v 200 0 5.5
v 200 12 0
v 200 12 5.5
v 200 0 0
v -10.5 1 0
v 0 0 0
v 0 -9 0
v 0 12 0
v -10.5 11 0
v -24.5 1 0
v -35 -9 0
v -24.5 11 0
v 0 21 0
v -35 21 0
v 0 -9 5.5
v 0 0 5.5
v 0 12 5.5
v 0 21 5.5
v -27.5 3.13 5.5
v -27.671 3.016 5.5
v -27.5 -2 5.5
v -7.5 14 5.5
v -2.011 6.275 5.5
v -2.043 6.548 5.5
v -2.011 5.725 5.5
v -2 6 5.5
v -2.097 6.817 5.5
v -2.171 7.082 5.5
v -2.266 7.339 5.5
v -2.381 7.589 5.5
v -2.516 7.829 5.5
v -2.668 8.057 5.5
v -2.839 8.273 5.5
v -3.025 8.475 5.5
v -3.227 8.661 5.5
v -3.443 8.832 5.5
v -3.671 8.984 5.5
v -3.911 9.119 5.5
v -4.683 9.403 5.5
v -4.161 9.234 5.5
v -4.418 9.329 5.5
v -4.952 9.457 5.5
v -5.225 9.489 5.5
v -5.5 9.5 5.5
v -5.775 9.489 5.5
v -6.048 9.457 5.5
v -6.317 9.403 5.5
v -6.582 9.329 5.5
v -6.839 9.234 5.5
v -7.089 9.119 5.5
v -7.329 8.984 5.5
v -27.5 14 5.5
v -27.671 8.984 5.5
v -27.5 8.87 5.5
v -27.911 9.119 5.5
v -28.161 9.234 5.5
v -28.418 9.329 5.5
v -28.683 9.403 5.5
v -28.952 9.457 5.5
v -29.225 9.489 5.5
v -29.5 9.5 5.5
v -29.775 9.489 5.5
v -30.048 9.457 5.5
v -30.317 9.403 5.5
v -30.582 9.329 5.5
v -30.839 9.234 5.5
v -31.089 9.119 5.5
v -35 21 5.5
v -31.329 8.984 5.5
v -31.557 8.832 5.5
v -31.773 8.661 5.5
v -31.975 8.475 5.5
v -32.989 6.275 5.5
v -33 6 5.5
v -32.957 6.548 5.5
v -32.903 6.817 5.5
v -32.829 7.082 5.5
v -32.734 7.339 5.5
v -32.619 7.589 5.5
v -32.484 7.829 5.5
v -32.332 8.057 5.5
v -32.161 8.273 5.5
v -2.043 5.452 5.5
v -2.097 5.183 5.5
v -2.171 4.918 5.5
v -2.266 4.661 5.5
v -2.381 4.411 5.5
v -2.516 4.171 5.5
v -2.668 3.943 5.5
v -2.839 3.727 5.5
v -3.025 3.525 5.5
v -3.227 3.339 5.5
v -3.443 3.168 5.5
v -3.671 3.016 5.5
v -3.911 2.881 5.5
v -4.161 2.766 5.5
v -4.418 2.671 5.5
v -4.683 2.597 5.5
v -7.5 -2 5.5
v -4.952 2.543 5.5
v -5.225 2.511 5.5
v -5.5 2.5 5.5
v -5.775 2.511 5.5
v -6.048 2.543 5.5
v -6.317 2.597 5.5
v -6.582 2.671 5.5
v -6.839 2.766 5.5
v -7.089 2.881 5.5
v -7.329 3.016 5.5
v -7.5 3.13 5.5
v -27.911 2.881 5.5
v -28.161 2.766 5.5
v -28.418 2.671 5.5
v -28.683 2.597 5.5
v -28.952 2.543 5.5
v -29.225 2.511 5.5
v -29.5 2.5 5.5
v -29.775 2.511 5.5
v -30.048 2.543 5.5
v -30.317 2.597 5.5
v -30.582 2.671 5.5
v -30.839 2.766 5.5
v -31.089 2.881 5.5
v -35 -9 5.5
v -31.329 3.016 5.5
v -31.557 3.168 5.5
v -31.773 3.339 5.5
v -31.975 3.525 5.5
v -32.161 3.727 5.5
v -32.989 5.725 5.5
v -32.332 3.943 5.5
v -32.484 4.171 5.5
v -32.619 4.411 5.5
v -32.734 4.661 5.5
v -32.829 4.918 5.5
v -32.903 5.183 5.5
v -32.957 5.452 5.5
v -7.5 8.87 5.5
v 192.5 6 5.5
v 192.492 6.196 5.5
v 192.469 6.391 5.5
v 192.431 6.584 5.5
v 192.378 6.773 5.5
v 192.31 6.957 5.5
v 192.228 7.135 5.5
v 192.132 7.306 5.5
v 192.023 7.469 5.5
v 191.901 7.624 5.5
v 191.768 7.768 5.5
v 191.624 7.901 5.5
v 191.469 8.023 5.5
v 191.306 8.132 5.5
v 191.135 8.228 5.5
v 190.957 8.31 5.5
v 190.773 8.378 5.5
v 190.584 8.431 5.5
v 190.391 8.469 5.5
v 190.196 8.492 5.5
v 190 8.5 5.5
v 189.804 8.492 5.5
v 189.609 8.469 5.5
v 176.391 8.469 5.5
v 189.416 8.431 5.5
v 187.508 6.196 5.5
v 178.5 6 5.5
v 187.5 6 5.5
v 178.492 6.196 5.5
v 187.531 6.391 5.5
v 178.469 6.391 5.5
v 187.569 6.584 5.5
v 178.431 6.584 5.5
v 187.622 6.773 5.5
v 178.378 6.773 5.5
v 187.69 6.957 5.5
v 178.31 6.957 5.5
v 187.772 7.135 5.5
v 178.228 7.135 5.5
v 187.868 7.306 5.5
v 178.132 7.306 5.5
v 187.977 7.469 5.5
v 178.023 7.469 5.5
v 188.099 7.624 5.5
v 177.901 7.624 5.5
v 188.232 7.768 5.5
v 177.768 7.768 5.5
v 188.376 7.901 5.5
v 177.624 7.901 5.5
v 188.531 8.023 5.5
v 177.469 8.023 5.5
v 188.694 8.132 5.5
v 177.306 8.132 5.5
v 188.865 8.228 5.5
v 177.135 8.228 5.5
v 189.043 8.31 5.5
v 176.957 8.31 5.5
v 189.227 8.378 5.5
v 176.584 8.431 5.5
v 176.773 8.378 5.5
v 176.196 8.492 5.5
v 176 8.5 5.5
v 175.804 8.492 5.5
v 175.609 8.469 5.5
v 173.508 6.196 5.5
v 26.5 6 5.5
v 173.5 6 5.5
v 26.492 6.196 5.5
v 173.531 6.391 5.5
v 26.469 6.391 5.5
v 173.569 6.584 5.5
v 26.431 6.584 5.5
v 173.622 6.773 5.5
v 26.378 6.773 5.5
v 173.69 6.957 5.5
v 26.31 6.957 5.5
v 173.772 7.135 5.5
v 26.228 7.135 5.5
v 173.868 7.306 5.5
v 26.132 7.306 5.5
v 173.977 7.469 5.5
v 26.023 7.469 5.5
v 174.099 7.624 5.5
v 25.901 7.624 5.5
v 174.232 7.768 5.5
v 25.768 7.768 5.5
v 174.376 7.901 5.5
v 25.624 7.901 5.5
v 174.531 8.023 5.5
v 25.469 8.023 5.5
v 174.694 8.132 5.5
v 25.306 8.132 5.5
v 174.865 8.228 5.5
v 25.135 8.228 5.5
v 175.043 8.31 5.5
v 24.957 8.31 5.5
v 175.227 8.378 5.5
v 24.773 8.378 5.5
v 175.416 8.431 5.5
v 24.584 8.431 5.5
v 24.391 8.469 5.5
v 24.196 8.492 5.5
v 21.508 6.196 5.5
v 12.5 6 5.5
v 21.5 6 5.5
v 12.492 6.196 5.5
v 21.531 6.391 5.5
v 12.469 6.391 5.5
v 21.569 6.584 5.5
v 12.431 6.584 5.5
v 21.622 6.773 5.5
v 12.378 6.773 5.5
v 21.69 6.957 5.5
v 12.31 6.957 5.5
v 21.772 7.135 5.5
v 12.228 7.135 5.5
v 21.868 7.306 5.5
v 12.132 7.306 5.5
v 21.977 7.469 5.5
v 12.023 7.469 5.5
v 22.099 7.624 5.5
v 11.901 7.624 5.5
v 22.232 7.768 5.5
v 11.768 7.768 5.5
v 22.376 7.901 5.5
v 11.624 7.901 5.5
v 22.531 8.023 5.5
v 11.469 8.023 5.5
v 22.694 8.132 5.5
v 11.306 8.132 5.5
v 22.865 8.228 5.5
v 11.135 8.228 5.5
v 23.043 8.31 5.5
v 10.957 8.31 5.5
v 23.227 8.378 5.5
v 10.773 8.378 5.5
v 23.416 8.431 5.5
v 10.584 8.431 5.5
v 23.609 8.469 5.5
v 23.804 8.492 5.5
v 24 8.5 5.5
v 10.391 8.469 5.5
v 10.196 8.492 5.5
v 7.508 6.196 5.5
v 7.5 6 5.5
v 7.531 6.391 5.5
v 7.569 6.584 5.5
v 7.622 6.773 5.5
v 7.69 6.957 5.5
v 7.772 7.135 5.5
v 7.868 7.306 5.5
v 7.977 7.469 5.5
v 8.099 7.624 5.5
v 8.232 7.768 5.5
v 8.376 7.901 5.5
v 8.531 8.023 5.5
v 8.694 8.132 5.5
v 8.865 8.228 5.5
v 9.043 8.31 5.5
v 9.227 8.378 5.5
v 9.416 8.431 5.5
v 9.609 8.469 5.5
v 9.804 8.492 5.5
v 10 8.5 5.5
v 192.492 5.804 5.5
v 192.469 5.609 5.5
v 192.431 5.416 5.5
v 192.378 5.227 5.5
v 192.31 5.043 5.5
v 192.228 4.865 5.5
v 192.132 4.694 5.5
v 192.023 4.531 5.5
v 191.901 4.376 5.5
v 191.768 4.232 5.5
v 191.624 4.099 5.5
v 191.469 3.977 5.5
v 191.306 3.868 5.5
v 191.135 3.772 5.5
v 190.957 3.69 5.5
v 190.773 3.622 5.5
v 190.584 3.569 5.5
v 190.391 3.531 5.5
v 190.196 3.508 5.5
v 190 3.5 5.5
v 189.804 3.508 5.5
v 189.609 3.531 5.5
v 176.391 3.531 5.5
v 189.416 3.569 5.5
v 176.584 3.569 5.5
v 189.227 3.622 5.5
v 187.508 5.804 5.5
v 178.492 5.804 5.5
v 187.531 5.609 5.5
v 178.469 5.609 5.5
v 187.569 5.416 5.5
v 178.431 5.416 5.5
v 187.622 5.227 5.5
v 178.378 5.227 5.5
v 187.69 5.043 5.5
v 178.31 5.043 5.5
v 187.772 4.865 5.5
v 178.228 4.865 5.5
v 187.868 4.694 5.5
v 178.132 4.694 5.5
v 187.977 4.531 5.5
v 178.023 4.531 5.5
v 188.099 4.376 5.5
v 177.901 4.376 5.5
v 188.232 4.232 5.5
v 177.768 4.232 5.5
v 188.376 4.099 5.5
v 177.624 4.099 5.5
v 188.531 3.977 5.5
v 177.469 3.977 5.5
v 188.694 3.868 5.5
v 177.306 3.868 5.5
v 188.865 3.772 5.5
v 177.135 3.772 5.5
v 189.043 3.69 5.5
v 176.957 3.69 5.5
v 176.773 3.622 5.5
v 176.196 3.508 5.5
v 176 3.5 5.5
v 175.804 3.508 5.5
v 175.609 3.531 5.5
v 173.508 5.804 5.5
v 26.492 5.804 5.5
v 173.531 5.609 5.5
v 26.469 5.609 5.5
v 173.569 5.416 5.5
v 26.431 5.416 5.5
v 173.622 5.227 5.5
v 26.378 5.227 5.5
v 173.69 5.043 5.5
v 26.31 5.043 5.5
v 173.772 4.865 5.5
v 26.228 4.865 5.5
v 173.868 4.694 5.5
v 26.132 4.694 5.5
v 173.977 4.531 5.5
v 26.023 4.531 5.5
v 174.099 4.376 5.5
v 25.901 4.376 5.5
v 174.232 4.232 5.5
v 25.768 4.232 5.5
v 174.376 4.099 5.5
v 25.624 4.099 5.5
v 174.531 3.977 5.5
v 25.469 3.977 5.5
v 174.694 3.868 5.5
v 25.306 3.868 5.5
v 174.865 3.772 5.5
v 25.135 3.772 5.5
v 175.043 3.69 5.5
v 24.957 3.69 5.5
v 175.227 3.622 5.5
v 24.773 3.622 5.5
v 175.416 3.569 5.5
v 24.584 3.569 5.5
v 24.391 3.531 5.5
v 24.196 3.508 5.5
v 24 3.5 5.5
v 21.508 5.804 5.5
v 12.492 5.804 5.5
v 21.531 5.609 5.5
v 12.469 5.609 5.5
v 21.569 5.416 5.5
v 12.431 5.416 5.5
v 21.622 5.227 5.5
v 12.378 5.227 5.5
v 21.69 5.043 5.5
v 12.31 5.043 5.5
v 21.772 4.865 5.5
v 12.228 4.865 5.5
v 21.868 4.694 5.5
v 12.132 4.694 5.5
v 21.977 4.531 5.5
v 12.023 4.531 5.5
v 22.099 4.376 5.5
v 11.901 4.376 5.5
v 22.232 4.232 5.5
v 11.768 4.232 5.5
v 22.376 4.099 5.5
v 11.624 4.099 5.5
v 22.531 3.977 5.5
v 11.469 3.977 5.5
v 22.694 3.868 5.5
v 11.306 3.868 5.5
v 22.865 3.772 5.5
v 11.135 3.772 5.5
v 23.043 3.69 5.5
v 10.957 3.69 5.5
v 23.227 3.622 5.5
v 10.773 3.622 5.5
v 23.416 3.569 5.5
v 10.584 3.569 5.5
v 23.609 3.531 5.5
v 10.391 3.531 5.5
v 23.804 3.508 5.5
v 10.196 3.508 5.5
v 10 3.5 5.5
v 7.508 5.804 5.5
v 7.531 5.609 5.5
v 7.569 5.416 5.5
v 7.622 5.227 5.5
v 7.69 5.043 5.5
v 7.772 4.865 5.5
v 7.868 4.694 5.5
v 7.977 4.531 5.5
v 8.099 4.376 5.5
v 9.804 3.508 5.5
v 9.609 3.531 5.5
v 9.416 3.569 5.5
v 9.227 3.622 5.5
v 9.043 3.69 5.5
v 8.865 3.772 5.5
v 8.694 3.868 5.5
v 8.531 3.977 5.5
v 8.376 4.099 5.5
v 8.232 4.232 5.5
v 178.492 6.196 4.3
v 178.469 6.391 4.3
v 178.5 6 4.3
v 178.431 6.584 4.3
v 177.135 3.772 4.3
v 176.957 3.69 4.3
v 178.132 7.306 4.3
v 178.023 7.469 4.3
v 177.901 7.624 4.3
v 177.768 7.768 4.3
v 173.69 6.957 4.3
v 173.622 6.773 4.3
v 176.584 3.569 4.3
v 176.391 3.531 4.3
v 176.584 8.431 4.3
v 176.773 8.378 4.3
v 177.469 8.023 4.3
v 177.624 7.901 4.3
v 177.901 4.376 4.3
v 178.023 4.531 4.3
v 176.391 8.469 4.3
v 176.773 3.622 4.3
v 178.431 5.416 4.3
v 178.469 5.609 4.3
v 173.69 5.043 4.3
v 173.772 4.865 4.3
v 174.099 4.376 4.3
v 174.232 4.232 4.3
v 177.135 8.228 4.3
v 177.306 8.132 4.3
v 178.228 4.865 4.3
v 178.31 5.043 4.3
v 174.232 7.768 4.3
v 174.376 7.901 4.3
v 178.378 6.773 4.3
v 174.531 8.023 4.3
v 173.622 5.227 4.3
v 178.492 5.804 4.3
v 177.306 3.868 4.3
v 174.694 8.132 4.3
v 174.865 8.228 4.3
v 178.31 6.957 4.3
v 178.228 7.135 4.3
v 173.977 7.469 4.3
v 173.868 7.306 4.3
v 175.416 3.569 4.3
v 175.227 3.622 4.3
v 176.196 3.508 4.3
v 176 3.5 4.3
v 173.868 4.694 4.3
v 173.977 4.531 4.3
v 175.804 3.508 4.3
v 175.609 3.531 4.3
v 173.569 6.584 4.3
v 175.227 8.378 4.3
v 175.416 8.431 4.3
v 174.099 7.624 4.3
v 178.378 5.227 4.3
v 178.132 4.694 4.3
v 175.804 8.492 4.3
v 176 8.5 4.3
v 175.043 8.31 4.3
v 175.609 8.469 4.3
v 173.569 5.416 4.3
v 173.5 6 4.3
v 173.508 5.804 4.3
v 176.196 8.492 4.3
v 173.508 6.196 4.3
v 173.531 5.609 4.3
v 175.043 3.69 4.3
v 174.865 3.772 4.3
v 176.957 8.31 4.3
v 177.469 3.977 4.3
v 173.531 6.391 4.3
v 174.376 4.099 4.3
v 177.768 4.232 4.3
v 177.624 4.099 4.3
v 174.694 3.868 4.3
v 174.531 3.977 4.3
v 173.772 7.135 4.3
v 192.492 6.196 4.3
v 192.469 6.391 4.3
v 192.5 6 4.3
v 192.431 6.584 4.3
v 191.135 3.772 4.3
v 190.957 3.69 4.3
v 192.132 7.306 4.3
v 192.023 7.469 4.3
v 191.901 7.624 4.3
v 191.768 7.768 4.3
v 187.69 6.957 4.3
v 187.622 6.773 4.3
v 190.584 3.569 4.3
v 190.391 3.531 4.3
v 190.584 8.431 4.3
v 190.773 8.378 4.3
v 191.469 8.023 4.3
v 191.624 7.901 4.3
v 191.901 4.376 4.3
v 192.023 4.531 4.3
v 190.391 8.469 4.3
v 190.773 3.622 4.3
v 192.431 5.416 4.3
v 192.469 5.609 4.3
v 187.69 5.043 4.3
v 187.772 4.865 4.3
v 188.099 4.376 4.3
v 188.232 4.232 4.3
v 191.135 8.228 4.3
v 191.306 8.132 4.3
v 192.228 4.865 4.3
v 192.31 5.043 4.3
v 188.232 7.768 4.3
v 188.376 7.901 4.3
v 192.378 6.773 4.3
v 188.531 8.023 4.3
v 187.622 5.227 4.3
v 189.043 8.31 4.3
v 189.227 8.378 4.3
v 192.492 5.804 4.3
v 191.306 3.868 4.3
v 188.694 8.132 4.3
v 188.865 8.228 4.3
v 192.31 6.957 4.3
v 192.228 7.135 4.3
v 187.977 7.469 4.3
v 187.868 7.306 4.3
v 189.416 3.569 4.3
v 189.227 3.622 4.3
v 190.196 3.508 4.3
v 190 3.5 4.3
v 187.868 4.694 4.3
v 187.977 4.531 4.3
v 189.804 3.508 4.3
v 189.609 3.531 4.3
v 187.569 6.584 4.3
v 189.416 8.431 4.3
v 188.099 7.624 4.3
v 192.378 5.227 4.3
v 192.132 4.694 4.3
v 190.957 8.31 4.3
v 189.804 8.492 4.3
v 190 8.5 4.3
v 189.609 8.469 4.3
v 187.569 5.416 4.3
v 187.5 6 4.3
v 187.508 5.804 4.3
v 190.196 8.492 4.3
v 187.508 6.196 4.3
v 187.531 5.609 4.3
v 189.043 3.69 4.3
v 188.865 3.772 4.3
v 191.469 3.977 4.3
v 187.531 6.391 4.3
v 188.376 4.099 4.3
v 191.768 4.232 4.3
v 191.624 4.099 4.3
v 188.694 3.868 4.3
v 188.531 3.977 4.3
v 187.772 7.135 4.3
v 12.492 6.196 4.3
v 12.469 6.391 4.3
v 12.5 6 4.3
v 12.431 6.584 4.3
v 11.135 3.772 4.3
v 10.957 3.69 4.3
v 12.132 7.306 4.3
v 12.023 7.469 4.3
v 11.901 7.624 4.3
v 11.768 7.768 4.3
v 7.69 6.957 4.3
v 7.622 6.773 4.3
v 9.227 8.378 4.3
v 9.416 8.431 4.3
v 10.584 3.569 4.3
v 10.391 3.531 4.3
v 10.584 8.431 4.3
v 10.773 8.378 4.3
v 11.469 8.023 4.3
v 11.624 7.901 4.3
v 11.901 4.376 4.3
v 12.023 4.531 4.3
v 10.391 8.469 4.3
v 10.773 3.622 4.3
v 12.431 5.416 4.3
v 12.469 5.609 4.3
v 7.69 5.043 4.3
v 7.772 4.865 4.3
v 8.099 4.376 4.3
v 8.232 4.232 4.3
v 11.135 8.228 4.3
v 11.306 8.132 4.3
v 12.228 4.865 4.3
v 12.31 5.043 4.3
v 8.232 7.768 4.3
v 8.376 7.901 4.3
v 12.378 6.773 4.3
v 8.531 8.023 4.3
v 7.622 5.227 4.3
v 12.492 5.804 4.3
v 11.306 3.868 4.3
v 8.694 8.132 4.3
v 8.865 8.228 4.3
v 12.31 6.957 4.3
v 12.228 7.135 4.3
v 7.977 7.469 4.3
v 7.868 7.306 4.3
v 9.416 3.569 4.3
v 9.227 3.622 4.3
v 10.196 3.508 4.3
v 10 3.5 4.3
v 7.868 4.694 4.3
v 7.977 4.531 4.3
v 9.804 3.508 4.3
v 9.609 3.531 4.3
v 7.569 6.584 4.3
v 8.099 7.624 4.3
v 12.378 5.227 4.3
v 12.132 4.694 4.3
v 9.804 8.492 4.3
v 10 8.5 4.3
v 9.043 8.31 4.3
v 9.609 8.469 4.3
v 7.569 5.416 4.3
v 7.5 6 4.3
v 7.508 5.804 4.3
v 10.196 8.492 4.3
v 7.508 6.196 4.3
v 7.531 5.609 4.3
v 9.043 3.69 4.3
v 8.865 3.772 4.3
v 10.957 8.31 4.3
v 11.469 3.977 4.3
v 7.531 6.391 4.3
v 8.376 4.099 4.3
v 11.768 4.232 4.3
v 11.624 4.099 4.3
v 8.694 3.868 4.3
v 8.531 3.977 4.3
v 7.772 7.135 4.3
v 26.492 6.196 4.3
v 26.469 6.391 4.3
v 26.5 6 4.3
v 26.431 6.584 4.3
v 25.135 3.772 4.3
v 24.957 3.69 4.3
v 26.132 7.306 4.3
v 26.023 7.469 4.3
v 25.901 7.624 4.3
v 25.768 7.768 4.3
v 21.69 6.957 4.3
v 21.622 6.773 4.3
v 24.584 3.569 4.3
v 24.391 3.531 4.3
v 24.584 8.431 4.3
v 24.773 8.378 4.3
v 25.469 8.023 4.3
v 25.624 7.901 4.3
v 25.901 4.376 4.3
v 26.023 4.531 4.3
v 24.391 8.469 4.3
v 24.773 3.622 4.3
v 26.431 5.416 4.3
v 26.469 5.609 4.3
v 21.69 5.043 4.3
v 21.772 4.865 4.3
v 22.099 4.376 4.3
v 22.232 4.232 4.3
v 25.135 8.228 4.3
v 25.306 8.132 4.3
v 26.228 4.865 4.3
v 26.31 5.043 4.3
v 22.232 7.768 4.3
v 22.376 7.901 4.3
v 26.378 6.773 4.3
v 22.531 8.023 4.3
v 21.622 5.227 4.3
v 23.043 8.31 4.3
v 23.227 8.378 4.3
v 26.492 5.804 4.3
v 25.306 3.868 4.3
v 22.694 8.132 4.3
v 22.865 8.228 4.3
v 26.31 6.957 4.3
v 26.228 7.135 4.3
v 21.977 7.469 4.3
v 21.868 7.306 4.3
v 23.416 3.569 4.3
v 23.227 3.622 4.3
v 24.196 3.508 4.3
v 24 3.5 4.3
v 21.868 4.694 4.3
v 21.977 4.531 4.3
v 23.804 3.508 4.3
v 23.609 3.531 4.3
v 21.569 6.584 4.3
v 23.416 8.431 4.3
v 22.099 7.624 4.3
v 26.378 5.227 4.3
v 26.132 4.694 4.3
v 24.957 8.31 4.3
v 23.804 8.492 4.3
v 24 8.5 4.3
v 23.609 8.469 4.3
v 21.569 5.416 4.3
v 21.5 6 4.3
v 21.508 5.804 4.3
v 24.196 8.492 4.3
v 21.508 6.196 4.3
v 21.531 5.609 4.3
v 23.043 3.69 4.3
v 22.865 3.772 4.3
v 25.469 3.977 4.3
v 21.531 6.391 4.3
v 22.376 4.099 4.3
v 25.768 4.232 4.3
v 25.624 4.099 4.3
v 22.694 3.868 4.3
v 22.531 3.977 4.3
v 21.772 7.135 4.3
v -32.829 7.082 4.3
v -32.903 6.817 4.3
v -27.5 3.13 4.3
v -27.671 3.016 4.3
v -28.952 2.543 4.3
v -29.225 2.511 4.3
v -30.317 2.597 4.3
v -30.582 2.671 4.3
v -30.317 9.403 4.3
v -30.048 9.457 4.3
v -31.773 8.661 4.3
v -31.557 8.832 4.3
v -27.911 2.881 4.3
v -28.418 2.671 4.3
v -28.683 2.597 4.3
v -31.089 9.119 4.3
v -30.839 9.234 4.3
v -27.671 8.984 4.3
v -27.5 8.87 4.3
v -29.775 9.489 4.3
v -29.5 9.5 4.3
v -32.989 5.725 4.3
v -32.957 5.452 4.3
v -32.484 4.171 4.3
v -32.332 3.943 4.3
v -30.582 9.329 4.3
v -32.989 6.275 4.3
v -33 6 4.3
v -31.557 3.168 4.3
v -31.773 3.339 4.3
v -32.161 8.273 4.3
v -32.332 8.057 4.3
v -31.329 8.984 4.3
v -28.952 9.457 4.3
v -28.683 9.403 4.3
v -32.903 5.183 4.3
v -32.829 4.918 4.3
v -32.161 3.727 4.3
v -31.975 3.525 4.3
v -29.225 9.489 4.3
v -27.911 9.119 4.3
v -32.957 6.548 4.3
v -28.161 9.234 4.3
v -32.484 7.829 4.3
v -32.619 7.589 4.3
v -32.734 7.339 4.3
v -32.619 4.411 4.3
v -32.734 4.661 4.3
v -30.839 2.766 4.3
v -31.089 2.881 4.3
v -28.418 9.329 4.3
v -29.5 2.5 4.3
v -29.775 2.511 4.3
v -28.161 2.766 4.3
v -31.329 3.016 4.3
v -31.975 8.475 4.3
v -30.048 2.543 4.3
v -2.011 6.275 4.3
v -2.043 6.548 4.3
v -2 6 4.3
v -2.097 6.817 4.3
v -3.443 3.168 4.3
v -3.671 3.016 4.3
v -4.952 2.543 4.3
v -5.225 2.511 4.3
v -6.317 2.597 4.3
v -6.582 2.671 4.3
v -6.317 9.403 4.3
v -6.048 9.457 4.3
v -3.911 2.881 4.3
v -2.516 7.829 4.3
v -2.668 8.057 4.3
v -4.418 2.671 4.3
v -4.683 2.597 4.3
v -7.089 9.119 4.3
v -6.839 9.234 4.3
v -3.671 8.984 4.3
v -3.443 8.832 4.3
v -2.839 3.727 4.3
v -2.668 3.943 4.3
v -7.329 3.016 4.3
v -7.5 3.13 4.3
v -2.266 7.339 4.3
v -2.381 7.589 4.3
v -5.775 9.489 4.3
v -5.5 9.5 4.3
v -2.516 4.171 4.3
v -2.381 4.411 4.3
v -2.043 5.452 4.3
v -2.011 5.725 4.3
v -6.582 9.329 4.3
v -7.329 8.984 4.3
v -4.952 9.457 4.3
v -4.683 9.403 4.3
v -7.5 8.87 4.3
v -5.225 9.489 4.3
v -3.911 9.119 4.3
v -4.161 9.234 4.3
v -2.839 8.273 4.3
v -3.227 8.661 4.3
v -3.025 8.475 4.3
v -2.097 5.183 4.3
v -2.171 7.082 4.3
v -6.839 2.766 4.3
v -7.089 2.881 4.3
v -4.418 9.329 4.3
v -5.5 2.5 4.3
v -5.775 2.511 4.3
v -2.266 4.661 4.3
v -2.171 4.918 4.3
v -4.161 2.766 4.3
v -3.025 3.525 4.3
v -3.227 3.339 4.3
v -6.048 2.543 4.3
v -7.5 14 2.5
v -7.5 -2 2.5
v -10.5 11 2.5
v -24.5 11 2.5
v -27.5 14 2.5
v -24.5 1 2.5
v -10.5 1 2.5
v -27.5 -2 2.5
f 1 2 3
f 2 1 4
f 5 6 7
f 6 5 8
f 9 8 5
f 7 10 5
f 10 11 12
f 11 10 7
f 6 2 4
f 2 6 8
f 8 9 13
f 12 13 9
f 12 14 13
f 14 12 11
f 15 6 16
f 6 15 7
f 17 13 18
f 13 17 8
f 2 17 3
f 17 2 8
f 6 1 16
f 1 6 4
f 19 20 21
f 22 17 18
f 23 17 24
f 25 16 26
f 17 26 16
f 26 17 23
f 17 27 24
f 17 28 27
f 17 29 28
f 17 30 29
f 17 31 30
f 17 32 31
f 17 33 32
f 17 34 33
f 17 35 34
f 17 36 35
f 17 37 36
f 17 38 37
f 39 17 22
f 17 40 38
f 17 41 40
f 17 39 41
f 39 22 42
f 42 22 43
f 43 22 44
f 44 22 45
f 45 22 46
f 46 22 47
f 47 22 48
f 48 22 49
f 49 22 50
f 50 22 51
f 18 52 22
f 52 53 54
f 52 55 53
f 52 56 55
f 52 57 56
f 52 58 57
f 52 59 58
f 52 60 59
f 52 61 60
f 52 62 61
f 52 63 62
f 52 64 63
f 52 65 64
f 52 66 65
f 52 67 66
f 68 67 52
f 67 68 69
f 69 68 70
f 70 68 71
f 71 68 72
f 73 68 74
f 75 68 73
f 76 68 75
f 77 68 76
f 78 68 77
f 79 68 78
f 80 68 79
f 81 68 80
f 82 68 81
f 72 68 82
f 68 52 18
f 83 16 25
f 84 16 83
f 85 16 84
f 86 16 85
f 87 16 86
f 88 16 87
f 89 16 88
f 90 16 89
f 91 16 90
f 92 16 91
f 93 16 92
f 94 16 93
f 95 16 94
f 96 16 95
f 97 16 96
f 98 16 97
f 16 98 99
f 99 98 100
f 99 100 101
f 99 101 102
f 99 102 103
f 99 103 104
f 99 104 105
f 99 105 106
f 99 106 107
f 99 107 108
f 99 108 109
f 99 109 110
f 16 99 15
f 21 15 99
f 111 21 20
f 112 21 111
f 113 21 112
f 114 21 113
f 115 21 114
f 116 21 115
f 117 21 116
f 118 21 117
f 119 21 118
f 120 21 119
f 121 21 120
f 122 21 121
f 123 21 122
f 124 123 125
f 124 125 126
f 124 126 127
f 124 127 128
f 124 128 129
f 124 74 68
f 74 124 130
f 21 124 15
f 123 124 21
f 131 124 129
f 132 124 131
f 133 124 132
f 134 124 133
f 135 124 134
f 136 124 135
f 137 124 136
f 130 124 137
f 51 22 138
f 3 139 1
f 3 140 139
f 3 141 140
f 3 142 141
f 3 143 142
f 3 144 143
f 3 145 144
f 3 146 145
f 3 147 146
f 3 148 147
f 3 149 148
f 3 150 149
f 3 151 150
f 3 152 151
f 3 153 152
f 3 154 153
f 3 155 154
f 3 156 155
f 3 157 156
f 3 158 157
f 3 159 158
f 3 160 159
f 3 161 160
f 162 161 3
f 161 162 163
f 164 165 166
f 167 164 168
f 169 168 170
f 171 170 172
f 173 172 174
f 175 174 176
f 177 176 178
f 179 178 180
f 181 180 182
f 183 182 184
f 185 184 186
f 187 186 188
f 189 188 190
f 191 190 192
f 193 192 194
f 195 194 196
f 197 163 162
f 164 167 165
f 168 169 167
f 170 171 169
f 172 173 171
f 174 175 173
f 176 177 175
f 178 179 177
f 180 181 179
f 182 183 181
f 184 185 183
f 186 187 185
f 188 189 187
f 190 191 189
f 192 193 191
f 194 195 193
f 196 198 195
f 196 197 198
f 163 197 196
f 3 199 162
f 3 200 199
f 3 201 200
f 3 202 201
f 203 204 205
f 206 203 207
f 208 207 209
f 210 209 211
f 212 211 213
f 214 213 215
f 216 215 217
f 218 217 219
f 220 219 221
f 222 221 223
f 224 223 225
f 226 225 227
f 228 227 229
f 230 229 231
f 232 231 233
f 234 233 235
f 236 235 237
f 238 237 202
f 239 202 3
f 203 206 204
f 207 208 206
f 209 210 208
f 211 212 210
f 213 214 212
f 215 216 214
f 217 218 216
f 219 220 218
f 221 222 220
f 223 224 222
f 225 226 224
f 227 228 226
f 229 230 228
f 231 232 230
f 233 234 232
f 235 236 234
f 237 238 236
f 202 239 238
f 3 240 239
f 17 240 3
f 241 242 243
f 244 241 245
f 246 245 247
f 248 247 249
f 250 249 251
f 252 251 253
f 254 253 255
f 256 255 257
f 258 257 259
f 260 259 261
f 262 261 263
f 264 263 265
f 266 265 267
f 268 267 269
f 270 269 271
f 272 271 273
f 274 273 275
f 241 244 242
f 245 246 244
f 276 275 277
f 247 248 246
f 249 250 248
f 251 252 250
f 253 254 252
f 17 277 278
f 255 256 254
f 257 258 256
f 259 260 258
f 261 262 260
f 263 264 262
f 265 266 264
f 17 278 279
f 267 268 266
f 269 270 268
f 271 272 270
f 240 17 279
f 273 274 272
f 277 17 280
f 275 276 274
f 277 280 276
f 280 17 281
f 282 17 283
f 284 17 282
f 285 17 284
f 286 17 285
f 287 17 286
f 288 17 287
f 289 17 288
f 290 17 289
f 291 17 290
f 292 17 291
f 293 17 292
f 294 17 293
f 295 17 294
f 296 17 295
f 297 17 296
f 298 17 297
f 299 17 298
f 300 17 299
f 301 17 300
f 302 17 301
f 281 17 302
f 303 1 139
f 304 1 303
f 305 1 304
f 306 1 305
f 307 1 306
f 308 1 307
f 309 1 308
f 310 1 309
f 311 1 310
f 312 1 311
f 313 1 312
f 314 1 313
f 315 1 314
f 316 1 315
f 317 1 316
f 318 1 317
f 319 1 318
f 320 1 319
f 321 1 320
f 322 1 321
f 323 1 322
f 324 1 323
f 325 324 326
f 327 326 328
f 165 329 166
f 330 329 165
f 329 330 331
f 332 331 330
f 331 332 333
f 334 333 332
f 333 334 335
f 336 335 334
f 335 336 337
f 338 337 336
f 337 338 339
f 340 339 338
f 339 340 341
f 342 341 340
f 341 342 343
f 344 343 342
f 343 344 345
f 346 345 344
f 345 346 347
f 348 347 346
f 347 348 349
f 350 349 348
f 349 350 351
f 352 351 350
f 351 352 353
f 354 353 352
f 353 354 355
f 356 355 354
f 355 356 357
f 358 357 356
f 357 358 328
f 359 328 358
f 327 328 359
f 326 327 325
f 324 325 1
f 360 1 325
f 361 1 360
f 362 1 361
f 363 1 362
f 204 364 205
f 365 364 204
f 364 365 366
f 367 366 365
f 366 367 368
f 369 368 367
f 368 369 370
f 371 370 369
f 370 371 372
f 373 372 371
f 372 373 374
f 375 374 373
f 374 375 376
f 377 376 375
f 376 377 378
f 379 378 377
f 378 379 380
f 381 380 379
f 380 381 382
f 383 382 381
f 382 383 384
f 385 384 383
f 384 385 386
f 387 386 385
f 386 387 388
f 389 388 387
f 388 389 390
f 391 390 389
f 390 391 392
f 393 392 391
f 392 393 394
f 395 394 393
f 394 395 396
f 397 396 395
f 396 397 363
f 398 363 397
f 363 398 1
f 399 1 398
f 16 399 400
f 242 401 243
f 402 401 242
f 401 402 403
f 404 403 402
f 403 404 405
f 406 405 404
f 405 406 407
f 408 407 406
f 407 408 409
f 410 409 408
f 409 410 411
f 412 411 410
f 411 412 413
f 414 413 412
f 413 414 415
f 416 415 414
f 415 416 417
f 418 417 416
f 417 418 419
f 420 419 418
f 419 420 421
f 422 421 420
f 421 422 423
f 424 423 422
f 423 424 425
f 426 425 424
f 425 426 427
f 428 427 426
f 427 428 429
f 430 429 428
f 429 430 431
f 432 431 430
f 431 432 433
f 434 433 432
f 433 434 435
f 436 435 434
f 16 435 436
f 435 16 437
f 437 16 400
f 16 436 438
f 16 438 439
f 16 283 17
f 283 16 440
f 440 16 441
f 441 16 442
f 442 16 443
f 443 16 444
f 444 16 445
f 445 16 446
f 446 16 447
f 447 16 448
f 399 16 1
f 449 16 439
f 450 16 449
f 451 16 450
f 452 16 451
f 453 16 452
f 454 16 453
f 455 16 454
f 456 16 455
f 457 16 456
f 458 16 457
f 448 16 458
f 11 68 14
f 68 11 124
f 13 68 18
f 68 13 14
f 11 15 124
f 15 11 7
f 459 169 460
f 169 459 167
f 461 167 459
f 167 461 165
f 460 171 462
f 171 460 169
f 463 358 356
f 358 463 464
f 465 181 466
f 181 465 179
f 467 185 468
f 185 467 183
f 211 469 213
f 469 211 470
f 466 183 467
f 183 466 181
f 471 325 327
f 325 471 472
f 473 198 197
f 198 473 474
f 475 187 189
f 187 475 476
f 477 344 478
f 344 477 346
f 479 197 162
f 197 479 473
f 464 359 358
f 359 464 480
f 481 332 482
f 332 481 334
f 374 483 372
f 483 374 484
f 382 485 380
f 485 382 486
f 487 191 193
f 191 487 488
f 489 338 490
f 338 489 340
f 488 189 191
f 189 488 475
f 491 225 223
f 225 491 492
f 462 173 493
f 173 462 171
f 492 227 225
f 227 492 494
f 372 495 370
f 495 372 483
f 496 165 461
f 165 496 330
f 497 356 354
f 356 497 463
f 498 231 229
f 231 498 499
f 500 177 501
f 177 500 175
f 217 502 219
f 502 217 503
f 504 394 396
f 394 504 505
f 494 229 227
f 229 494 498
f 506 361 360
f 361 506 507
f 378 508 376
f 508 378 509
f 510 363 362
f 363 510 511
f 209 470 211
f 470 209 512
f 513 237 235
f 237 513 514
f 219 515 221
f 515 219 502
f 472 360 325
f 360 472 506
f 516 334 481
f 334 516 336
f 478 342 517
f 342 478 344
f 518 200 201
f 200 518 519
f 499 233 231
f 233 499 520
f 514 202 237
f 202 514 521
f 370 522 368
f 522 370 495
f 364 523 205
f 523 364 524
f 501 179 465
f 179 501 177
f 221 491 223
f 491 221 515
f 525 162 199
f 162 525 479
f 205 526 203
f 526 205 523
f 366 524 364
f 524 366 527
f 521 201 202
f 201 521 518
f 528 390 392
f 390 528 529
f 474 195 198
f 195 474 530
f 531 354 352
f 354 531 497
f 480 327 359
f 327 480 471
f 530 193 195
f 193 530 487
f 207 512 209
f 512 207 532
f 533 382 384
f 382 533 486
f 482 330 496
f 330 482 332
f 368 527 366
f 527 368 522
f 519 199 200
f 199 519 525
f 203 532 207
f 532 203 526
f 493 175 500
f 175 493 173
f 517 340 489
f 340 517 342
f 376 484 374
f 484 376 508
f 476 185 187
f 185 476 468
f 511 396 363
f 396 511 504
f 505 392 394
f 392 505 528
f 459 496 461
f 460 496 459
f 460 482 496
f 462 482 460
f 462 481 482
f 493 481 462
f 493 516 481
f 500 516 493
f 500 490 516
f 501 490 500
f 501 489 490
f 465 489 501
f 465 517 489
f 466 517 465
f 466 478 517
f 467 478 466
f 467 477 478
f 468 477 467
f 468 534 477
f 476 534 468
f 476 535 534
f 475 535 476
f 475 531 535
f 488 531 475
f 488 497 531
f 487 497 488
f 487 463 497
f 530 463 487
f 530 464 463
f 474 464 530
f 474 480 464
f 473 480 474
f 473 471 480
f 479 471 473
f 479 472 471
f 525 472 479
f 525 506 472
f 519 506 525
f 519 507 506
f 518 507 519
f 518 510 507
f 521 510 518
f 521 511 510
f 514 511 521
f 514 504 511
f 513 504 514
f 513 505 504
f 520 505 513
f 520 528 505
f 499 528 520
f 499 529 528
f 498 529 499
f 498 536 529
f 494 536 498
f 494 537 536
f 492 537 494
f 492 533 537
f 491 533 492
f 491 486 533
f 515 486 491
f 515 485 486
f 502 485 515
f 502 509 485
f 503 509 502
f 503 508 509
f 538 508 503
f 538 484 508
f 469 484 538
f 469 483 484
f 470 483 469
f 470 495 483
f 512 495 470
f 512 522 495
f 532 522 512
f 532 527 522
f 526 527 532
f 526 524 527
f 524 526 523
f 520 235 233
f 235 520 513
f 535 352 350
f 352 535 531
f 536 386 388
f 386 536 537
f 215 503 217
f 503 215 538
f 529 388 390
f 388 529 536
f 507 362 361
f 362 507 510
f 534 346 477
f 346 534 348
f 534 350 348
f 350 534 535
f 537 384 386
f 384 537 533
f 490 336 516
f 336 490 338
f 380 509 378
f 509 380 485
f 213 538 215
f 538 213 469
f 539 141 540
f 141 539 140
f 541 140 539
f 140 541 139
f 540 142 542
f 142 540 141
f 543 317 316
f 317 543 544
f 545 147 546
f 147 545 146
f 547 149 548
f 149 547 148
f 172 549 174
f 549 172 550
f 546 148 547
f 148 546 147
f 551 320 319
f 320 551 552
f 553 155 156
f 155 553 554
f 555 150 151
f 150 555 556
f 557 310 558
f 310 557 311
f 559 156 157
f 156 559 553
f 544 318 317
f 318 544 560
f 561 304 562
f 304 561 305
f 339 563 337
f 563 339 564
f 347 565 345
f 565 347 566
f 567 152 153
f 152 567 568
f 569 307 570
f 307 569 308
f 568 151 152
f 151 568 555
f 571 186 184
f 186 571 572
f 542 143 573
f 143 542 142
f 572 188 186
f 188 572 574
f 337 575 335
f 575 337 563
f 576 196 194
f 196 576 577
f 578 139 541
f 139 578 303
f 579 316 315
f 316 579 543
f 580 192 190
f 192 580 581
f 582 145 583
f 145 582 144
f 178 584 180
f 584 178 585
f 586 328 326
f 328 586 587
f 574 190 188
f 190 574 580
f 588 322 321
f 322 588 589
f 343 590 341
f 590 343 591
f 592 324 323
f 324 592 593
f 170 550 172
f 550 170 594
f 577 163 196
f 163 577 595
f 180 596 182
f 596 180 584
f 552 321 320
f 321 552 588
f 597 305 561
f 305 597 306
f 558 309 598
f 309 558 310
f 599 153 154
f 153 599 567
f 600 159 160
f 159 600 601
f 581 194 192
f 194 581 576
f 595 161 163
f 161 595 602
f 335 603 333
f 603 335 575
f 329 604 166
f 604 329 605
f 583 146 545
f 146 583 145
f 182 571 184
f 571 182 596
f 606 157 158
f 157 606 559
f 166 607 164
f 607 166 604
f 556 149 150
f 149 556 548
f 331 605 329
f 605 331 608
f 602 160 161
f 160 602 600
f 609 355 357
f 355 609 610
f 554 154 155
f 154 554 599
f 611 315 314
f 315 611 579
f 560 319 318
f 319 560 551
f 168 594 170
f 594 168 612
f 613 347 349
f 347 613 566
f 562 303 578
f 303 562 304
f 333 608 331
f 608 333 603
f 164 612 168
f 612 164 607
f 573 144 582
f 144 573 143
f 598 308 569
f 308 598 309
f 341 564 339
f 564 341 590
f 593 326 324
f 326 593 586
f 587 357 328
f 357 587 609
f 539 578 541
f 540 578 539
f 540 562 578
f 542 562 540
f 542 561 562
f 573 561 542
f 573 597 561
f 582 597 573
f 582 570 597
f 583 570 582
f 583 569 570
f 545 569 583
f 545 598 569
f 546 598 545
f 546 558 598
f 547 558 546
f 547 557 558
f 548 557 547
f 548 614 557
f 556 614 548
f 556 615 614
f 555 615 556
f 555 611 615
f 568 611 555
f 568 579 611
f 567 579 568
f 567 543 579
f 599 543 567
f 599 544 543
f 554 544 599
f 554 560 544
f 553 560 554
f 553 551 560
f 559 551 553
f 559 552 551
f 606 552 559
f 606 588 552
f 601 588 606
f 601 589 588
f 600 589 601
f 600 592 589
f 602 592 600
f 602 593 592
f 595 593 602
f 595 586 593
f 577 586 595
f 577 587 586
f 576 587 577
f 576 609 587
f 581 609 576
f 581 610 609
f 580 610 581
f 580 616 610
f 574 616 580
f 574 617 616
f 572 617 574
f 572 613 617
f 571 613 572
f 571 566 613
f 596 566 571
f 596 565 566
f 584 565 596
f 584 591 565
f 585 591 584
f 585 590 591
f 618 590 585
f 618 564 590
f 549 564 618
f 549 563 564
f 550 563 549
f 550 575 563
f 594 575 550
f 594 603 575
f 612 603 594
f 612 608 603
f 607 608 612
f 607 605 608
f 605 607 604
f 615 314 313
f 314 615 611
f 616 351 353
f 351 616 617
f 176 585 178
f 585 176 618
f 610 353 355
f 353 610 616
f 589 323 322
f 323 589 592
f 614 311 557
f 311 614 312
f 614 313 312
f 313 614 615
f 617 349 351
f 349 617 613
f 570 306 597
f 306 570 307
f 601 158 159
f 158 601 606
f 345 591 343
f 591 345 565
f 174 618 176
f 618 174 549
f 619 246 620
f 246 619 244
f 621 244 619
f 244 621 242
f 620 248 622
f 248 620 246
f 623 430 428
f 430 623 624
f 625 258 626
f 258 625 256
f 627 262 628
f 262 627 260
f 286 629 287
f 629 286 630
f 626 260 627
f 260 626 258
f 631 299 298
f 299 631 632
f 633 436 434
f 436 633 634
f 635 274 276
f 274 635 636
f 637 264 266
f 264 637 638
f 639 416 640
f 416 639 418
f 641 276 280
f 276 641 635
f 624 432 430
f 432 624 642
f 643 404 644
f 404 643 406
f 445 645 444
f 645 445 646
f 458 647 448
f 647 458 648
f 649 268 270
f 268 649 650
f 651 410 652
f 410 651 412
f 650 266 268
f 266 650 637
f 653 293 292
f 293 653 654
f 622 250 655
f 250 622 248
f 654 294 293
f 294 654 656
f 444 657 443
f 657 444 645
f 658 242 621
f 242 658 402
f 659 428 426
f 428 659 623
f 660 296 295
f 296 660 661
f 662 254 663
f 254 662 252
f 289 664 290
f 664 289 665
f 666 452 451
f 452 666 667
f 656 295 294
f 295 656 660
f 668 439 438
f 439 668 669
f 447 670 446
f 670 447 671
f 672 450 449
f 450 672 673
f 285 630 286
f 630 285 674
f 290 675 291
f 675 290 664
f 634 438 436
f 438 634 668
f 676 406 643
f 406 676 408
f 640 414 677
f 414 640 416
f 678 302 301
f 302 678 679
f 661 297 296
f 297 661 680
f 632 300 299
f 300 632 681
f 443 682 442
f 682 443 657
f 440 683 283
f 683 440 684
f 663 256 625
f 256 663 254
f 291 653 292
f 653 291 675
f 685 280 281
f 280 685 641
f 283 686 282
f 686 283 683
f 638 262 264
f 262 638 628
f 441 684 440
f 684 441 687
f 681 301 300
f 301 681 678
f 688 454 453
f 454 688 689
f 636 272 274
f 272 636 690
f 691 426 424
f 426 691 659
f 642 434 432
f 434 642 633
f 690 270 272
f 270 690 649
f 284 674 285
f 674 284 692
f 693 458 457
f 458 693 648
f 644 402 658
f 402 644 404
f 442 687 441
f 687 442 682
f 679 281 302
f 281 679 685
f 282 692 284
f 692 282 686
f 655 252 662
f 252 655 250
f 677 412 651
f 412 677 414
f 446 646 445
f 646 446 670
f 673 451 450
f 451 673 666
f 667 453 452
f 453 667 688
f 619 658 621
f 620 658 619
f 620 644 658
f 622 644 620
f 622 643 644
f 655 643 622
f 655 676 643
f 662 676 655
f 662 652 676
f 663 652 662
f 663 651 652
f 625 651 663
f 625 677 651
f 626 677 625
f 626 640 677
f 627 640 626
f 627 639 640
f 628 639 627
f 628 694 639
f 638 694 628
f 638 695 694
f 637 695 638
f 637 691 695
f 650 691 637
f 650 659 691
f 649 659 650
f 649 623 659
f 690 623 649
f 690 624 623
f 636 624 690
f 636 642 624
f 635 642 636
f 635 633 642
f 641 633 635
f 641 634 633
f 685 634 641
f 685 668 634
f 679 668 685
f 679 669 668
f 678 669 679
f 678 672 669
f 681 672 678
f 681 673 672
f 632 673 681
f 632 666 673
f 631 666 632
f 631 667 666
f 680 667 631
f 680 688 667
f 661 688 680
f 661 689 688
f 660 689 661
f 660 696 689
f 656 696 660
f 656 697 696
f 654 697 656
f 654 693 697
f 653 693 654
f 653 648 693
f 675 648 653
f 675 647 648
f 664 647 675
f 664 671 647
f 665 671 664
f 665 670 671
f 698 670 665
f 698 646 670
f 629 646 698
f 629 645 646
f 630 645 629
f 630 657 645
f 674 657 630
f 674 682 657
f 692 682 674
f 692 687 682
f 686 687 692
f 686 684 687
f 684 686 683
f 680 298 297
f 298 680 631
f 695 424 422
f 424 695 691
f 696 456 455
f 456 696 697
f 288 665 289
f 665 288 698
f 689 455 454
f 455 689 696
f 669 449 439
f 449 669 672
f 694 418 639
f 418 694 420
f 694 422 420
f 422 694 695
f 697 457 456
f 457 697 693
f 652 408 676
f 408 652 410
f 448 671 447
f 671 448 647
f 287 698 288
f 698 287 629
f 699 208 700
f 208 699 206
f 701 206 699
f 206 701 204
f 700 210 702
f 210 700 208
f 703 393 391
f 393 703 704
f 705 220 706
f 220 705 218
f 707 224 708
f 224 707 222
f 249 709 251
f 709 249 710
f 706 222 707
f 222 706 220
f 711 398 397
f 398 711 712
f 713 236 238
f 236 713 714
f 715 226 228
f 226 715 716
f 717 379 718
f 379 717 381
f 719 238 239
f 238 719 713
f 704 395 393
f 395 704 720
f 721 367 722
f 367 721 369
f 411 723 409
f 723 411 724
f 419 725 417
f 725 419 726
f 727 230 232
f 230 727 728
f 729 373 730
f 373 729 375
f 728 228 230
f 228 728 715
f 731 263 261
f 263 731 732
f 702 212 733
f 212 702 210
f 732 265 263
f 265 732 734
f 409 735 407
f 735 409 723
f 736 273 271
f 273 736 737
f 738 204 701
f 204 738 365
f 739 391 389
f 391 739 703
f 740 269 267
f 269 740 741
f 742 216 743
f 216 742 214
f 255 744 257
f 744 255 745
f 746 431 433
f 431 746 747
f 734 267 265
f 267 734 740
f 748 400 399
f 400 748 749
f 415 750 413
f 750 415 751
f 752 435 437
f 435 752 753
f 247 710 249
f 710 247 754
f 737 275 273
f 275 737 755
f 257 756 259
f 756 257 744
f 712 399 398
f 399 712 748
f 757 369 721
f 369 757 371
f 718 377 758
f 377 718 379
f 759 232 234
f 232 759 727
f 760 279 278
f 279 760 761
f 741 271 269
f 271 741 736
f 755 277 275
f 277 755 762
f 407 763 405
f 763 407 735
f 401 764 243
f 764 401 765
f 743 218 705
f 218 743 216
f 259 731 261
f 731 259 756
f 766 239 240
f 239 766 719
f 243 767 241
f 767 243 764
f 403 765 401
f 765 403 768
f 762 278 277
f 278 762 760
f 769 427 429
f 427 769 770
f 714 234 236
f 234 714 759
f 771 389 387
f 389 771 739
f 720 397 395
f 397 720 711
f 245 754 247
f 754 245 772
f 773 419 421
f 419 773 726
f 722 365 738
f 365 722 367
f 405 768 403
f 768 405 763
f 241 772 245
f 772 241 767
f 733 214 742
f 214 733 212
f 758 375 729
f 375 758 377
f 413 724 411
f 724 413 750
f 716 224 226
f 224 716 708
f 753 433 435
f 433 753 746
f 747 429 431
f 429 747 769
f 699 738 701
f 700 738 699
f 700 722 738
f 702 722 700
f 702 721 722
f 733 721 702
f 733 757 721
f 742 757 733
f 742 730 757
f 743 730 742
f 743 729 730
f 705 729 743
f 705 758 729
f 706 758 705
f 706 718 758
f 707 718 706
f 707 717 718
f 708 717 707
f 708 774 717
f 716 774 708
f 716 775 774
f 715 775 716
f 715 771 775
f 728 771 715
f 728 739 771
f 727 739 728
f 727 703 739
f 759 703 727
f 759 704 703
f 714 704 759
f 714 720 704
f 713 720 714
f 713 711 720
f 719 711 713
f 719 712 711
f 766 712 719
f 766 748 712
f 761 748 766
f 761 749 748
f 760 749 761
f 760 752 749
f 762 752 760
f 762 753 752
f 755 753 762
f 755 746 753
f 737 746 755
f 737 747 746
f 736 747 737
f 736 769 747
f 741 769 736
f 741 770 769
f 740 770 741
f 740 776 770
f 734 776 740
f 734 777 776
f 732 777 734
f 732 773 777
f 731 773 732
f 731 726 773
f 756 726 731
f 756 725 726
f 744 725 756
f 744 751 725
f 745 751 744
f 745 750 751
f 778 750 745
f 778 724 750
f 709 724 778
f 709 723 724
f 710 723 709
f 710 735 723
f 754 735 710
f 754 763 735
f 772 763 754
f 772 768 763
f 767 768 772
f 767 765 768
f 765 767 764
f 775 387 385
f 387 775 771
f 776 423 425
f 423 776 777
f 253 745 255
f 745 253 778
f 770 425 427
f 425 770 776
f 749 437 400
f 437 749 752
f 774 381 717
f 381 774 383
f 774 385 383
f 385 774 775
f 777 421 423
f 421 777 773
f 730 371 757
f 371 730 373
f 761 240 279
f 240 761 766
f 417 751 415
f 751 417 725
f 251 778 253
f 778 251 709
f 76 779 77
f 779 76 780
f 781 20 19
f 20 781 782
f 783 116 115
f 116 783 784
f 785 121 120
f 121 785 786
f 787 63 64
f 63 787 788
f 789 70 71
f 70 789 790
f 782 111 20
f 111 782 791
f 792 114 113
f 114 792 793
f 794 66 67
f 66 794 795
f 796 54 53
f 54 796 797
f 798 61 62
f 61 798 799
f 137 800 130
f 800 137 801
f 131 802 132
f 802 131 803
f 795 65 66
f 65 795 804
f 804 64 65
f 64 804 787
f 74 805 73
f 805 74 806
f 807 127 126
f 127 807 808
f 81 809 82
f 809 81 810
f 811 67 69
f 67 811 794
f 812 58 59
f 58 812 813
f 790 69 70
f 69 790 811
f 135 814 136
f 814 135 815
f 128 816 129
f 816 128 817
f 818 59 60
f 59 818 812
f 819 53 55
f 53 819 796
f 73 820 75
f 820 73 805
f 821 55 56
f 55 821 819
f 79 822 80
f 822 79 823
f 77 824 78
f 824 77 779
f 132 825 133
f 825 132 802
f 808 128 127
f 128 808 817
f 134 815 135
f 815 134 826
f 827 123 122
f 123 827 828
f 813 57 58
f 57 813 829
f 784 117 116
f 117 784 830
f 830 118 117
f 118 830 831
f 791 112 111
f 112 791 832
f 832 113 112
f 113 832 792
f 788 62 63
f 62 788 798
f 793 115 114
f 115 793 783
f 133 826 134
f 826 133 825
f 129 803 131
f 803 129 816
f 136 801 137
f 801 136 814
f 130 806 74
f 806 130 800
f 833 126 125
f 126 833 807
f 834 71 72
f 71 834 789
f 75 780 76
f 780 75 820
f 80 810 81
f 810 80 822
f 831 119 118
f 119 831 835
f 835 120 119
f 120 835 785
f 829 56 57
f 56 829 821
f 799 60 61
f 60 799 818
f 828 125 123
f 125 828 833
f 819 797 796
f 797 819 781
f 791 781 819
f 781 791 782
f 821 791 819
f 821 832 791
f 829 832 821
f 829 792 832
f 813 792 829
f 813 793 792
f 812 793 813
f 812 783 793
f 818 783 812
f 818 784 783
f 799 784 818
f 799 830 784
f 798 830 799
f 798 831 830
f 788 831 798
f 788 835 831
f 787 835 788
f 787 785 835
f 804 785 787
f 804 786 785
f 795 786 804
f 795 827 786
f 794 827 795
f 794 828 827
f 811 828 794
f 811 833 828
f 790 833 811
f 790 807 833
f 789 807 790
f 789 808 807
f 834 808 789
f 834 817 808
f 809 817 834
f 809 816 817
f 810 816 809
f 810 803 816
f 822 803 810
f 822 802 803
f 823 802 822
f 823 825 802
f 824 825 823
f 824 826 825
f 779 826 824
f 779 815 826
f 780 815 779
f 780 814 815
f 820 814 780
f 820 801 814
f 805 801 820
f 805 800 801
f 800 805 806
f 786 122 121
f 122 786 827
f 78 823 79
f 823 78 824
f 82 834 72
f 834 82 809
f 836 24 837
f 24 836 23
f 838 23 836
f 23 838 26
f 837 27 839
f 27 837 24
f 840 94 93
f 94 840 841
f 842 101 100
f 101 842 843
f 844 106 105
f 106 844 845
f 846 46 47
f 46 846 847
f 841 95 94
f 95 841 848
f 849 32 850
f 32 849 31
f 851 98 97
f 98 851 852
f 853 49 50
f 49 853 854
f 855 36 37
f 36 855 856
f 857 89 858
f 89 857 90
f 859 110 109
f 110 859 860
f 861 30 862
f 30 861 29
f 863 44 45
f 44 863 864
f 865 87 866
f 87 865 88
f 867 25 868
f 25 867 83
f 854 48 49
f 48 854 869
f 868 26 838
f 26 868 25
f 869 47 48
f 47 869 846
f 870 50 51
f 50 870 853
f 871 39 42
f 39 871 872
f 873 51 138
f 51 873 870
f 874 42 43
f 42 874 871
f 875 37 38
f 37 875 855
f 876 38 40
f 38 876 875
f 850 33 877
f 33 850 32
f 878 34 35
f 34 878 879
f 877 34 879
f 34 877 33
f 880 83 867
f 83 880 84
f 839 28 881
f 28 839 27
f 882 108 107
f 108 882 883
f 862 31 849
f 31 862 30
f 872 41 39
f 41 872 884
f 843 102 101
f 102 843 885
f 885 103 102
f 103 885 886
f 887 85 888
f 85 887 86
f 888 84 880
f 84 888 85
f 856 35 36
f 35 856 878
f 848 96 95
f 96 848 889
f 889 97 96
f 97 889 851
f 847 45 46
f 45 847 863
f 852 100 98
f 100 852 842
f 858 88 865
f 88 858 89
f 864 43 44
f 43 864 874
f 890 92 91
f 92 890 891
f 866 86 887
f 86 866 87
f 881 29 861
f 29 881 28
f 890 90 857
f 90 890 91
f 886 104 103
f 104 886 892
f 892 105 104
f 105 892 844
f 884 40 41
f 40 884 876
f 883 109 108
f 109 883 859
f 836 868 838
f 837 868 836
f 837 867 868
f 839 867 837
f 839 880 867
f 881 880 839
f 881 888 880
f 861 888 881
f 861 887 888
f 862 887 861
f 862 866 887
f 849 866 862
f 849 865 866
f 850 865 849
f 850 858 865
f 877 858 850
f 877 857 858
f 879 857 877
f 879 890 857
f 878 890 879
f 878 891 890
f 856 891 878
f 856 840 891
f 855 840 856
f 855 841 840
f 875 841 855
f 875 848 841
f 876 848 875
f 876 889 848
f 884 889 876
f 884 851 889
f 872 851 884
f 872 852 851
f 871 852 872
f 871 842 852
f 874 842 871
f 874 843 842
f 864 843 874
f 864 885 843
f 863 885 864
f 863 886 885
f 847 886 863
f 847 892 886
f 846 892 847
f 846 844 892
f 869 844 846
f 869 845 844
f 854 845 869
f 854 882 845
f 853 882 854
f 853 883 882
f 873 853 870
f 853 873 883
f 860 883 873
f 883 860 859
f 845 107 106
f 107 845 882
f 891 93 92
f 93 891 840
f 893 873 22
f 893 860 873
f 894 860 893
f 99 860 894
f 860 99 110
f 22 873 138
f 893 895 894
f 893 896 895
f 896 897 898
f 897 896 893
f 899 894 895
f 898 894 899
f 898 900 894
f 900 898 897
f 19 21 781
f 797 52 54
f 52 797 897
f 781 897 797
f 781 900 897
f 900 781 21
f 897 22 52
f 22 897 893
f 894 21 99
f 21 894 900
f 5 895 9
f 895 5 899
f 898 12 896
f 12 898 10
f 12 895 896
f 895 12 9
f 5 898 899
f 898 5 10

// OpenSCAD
// === Parametric Long Rail with End Block ===

// --- Main Rail Parameters ---
rail_length       = 200;    // full length of the slim rail
rail_width        = 12;     // narrow width of the rail
rail_base_height  = 4;      // lower body height
rail_top_height   = 1.5;    // shallow top layer height
rail_total_height = rail_base_height + rail_top_height;

// --- Top Layer Inset (slightly narrower or same width) ---
top_layer_inset   = 0;      // 0 = same width as base

// --- Circular Recess Features Near Rail Ends ---
recess_diameter     = 5;
recess_depth        = 1.2;  // shallow recess into top layer
recess_end_offset   = 10;   // distance from each rail end to recess center
recess_count_per_end = 2;   // number of recesses per end
recess_spacing      = 14;   // spacing between multiple recesses along length

// --- End Block Parameters ---
block_length       = 35;    // how far the block extends beyond rail end
block_width        = 30;    // wider than the rail
block_base_height  = rail_base_height;
block_top_height   = rail_top_height;
block_total_height = block_base_height + block_top_height;

// --- End Block Removed Features ---
// Shallow circular recesses on top of end block
block_recess_diameter = 7;
block_recess_depth    = 1.2;
block_recess_x_off    = 12;   // offset from block center along X
block_recess_y_off    = 0;    // centered on block

// Deep cutout through end block (stepped: goes through top layer + into/through base)
deep_cutout_length    = 14;
deep_cutout_width     = 10;
deep_cutout_depth     = rail_total_height + 1; // fully through

// Shallow step cutout (partial depth pocket above the deep cutout area)
step_cutout_length    = 20;
step_cutout_width     = 16;
step_cutout_depth     = rail_top_height + 1.5; // through top layer + shallow into base

// --- Resolution ---
$fn = 80;

// =============================================
// Module: Main slim rail with shallow top layer
// =============================================
module rail_body() {
    // Lower base rail
    cube([rail_length, rail_width, rail_base_height]);
    // Shallow top layer (full length)
    translate([0, top_layer_inset / 2, rail_base_height])
        cube([rail_length, rail_width - top_layer_inset, rail_top_height]);
}

// =============================================
// Module: Circular recess (cylinder for subtraction)
// =============================================
module circular_recess(d, depth) {
    translate([0, 0, -depth])
        cylinder(d = d, h = depth + 0.01);
}

// =============================================
// Module: Rail-end recesses near one end
// =============================================
module end_recesses(start_x) {
    for (i = [0 : recess_count_per_end - 1]) {
        translate([start_x + i * recess_spacing, rail_width / 2, rail_total_height])
            circular_recess(recess_diameter, recess_depth);
    }
}

// =============================================
// Module: End block extension (wider block at one end)
// =============================================
module end_block_body() {
    // Positioned so it extends beyond rail at x=0, centered on rail's Y center
    translate([-block_length, -(block_width - rail_width) / 2, 0]) {
        // Lower base
        cube([block_length, block_width, block_base_height]);
        // Shallow top layer
        translate([0, 0, block_base_height])
            cube([block_length, block_width, block_top_height]);
    }
}

// =============================================
// Module: End block removed features
// =============================================
module end_block_recesses() {
    block_center_x = -block_length / 2;
    block_center_y = rail_width / 2;

    // Pair of shallow circular recesses on top surface
    for (dx = [-1, 1]) {
        translate([block_center_x + dx * block_recess_x_off,
                   block_center_y + block_recess_y_off,
                   block_total_height])
            circular_recess(block_recess_diameter, block_recess_depth);
    }

    // Shallow stepped pocket (intermediate depth)
    translate([block_center_x - step_cutout_length / 2,
               block_center_y - step_cutout_width / 2,
               block_total_height - step_cutout_depth])
        cube([step_cutout_length, step_cutout_width, step_cutout_depth + 0.01]);

    // Deep cutout (goes fully through the block)
    translate([block_center_x - deep_cutout_length / 2,
               block_center_y - deep_cutout_width / 2,
               -0.01])
        cube([deep_cutout_length, deep_cutout_width, deep_cutout_depth]);
}

// =============================================
// Final Assembly
// =============================================
difference() {
    union() {
        // Main long rail
        rail_body();
        // Wider end block at x=0 side (extends into negative X)
        end_block_body();
    }

    // Recesses near the far end of rail (x = rail_length side)
    end_recesses(rail_length - recess_end_offset - (recess_count_per_end - 1) * recess_spacing);

    // Recesses near the block end of rail (x ≈ 0 side)
    end_recesses(recess_end_offset);

    // End block circular recesses and deep/stepped cutouts
    end_block_recesses();
}
